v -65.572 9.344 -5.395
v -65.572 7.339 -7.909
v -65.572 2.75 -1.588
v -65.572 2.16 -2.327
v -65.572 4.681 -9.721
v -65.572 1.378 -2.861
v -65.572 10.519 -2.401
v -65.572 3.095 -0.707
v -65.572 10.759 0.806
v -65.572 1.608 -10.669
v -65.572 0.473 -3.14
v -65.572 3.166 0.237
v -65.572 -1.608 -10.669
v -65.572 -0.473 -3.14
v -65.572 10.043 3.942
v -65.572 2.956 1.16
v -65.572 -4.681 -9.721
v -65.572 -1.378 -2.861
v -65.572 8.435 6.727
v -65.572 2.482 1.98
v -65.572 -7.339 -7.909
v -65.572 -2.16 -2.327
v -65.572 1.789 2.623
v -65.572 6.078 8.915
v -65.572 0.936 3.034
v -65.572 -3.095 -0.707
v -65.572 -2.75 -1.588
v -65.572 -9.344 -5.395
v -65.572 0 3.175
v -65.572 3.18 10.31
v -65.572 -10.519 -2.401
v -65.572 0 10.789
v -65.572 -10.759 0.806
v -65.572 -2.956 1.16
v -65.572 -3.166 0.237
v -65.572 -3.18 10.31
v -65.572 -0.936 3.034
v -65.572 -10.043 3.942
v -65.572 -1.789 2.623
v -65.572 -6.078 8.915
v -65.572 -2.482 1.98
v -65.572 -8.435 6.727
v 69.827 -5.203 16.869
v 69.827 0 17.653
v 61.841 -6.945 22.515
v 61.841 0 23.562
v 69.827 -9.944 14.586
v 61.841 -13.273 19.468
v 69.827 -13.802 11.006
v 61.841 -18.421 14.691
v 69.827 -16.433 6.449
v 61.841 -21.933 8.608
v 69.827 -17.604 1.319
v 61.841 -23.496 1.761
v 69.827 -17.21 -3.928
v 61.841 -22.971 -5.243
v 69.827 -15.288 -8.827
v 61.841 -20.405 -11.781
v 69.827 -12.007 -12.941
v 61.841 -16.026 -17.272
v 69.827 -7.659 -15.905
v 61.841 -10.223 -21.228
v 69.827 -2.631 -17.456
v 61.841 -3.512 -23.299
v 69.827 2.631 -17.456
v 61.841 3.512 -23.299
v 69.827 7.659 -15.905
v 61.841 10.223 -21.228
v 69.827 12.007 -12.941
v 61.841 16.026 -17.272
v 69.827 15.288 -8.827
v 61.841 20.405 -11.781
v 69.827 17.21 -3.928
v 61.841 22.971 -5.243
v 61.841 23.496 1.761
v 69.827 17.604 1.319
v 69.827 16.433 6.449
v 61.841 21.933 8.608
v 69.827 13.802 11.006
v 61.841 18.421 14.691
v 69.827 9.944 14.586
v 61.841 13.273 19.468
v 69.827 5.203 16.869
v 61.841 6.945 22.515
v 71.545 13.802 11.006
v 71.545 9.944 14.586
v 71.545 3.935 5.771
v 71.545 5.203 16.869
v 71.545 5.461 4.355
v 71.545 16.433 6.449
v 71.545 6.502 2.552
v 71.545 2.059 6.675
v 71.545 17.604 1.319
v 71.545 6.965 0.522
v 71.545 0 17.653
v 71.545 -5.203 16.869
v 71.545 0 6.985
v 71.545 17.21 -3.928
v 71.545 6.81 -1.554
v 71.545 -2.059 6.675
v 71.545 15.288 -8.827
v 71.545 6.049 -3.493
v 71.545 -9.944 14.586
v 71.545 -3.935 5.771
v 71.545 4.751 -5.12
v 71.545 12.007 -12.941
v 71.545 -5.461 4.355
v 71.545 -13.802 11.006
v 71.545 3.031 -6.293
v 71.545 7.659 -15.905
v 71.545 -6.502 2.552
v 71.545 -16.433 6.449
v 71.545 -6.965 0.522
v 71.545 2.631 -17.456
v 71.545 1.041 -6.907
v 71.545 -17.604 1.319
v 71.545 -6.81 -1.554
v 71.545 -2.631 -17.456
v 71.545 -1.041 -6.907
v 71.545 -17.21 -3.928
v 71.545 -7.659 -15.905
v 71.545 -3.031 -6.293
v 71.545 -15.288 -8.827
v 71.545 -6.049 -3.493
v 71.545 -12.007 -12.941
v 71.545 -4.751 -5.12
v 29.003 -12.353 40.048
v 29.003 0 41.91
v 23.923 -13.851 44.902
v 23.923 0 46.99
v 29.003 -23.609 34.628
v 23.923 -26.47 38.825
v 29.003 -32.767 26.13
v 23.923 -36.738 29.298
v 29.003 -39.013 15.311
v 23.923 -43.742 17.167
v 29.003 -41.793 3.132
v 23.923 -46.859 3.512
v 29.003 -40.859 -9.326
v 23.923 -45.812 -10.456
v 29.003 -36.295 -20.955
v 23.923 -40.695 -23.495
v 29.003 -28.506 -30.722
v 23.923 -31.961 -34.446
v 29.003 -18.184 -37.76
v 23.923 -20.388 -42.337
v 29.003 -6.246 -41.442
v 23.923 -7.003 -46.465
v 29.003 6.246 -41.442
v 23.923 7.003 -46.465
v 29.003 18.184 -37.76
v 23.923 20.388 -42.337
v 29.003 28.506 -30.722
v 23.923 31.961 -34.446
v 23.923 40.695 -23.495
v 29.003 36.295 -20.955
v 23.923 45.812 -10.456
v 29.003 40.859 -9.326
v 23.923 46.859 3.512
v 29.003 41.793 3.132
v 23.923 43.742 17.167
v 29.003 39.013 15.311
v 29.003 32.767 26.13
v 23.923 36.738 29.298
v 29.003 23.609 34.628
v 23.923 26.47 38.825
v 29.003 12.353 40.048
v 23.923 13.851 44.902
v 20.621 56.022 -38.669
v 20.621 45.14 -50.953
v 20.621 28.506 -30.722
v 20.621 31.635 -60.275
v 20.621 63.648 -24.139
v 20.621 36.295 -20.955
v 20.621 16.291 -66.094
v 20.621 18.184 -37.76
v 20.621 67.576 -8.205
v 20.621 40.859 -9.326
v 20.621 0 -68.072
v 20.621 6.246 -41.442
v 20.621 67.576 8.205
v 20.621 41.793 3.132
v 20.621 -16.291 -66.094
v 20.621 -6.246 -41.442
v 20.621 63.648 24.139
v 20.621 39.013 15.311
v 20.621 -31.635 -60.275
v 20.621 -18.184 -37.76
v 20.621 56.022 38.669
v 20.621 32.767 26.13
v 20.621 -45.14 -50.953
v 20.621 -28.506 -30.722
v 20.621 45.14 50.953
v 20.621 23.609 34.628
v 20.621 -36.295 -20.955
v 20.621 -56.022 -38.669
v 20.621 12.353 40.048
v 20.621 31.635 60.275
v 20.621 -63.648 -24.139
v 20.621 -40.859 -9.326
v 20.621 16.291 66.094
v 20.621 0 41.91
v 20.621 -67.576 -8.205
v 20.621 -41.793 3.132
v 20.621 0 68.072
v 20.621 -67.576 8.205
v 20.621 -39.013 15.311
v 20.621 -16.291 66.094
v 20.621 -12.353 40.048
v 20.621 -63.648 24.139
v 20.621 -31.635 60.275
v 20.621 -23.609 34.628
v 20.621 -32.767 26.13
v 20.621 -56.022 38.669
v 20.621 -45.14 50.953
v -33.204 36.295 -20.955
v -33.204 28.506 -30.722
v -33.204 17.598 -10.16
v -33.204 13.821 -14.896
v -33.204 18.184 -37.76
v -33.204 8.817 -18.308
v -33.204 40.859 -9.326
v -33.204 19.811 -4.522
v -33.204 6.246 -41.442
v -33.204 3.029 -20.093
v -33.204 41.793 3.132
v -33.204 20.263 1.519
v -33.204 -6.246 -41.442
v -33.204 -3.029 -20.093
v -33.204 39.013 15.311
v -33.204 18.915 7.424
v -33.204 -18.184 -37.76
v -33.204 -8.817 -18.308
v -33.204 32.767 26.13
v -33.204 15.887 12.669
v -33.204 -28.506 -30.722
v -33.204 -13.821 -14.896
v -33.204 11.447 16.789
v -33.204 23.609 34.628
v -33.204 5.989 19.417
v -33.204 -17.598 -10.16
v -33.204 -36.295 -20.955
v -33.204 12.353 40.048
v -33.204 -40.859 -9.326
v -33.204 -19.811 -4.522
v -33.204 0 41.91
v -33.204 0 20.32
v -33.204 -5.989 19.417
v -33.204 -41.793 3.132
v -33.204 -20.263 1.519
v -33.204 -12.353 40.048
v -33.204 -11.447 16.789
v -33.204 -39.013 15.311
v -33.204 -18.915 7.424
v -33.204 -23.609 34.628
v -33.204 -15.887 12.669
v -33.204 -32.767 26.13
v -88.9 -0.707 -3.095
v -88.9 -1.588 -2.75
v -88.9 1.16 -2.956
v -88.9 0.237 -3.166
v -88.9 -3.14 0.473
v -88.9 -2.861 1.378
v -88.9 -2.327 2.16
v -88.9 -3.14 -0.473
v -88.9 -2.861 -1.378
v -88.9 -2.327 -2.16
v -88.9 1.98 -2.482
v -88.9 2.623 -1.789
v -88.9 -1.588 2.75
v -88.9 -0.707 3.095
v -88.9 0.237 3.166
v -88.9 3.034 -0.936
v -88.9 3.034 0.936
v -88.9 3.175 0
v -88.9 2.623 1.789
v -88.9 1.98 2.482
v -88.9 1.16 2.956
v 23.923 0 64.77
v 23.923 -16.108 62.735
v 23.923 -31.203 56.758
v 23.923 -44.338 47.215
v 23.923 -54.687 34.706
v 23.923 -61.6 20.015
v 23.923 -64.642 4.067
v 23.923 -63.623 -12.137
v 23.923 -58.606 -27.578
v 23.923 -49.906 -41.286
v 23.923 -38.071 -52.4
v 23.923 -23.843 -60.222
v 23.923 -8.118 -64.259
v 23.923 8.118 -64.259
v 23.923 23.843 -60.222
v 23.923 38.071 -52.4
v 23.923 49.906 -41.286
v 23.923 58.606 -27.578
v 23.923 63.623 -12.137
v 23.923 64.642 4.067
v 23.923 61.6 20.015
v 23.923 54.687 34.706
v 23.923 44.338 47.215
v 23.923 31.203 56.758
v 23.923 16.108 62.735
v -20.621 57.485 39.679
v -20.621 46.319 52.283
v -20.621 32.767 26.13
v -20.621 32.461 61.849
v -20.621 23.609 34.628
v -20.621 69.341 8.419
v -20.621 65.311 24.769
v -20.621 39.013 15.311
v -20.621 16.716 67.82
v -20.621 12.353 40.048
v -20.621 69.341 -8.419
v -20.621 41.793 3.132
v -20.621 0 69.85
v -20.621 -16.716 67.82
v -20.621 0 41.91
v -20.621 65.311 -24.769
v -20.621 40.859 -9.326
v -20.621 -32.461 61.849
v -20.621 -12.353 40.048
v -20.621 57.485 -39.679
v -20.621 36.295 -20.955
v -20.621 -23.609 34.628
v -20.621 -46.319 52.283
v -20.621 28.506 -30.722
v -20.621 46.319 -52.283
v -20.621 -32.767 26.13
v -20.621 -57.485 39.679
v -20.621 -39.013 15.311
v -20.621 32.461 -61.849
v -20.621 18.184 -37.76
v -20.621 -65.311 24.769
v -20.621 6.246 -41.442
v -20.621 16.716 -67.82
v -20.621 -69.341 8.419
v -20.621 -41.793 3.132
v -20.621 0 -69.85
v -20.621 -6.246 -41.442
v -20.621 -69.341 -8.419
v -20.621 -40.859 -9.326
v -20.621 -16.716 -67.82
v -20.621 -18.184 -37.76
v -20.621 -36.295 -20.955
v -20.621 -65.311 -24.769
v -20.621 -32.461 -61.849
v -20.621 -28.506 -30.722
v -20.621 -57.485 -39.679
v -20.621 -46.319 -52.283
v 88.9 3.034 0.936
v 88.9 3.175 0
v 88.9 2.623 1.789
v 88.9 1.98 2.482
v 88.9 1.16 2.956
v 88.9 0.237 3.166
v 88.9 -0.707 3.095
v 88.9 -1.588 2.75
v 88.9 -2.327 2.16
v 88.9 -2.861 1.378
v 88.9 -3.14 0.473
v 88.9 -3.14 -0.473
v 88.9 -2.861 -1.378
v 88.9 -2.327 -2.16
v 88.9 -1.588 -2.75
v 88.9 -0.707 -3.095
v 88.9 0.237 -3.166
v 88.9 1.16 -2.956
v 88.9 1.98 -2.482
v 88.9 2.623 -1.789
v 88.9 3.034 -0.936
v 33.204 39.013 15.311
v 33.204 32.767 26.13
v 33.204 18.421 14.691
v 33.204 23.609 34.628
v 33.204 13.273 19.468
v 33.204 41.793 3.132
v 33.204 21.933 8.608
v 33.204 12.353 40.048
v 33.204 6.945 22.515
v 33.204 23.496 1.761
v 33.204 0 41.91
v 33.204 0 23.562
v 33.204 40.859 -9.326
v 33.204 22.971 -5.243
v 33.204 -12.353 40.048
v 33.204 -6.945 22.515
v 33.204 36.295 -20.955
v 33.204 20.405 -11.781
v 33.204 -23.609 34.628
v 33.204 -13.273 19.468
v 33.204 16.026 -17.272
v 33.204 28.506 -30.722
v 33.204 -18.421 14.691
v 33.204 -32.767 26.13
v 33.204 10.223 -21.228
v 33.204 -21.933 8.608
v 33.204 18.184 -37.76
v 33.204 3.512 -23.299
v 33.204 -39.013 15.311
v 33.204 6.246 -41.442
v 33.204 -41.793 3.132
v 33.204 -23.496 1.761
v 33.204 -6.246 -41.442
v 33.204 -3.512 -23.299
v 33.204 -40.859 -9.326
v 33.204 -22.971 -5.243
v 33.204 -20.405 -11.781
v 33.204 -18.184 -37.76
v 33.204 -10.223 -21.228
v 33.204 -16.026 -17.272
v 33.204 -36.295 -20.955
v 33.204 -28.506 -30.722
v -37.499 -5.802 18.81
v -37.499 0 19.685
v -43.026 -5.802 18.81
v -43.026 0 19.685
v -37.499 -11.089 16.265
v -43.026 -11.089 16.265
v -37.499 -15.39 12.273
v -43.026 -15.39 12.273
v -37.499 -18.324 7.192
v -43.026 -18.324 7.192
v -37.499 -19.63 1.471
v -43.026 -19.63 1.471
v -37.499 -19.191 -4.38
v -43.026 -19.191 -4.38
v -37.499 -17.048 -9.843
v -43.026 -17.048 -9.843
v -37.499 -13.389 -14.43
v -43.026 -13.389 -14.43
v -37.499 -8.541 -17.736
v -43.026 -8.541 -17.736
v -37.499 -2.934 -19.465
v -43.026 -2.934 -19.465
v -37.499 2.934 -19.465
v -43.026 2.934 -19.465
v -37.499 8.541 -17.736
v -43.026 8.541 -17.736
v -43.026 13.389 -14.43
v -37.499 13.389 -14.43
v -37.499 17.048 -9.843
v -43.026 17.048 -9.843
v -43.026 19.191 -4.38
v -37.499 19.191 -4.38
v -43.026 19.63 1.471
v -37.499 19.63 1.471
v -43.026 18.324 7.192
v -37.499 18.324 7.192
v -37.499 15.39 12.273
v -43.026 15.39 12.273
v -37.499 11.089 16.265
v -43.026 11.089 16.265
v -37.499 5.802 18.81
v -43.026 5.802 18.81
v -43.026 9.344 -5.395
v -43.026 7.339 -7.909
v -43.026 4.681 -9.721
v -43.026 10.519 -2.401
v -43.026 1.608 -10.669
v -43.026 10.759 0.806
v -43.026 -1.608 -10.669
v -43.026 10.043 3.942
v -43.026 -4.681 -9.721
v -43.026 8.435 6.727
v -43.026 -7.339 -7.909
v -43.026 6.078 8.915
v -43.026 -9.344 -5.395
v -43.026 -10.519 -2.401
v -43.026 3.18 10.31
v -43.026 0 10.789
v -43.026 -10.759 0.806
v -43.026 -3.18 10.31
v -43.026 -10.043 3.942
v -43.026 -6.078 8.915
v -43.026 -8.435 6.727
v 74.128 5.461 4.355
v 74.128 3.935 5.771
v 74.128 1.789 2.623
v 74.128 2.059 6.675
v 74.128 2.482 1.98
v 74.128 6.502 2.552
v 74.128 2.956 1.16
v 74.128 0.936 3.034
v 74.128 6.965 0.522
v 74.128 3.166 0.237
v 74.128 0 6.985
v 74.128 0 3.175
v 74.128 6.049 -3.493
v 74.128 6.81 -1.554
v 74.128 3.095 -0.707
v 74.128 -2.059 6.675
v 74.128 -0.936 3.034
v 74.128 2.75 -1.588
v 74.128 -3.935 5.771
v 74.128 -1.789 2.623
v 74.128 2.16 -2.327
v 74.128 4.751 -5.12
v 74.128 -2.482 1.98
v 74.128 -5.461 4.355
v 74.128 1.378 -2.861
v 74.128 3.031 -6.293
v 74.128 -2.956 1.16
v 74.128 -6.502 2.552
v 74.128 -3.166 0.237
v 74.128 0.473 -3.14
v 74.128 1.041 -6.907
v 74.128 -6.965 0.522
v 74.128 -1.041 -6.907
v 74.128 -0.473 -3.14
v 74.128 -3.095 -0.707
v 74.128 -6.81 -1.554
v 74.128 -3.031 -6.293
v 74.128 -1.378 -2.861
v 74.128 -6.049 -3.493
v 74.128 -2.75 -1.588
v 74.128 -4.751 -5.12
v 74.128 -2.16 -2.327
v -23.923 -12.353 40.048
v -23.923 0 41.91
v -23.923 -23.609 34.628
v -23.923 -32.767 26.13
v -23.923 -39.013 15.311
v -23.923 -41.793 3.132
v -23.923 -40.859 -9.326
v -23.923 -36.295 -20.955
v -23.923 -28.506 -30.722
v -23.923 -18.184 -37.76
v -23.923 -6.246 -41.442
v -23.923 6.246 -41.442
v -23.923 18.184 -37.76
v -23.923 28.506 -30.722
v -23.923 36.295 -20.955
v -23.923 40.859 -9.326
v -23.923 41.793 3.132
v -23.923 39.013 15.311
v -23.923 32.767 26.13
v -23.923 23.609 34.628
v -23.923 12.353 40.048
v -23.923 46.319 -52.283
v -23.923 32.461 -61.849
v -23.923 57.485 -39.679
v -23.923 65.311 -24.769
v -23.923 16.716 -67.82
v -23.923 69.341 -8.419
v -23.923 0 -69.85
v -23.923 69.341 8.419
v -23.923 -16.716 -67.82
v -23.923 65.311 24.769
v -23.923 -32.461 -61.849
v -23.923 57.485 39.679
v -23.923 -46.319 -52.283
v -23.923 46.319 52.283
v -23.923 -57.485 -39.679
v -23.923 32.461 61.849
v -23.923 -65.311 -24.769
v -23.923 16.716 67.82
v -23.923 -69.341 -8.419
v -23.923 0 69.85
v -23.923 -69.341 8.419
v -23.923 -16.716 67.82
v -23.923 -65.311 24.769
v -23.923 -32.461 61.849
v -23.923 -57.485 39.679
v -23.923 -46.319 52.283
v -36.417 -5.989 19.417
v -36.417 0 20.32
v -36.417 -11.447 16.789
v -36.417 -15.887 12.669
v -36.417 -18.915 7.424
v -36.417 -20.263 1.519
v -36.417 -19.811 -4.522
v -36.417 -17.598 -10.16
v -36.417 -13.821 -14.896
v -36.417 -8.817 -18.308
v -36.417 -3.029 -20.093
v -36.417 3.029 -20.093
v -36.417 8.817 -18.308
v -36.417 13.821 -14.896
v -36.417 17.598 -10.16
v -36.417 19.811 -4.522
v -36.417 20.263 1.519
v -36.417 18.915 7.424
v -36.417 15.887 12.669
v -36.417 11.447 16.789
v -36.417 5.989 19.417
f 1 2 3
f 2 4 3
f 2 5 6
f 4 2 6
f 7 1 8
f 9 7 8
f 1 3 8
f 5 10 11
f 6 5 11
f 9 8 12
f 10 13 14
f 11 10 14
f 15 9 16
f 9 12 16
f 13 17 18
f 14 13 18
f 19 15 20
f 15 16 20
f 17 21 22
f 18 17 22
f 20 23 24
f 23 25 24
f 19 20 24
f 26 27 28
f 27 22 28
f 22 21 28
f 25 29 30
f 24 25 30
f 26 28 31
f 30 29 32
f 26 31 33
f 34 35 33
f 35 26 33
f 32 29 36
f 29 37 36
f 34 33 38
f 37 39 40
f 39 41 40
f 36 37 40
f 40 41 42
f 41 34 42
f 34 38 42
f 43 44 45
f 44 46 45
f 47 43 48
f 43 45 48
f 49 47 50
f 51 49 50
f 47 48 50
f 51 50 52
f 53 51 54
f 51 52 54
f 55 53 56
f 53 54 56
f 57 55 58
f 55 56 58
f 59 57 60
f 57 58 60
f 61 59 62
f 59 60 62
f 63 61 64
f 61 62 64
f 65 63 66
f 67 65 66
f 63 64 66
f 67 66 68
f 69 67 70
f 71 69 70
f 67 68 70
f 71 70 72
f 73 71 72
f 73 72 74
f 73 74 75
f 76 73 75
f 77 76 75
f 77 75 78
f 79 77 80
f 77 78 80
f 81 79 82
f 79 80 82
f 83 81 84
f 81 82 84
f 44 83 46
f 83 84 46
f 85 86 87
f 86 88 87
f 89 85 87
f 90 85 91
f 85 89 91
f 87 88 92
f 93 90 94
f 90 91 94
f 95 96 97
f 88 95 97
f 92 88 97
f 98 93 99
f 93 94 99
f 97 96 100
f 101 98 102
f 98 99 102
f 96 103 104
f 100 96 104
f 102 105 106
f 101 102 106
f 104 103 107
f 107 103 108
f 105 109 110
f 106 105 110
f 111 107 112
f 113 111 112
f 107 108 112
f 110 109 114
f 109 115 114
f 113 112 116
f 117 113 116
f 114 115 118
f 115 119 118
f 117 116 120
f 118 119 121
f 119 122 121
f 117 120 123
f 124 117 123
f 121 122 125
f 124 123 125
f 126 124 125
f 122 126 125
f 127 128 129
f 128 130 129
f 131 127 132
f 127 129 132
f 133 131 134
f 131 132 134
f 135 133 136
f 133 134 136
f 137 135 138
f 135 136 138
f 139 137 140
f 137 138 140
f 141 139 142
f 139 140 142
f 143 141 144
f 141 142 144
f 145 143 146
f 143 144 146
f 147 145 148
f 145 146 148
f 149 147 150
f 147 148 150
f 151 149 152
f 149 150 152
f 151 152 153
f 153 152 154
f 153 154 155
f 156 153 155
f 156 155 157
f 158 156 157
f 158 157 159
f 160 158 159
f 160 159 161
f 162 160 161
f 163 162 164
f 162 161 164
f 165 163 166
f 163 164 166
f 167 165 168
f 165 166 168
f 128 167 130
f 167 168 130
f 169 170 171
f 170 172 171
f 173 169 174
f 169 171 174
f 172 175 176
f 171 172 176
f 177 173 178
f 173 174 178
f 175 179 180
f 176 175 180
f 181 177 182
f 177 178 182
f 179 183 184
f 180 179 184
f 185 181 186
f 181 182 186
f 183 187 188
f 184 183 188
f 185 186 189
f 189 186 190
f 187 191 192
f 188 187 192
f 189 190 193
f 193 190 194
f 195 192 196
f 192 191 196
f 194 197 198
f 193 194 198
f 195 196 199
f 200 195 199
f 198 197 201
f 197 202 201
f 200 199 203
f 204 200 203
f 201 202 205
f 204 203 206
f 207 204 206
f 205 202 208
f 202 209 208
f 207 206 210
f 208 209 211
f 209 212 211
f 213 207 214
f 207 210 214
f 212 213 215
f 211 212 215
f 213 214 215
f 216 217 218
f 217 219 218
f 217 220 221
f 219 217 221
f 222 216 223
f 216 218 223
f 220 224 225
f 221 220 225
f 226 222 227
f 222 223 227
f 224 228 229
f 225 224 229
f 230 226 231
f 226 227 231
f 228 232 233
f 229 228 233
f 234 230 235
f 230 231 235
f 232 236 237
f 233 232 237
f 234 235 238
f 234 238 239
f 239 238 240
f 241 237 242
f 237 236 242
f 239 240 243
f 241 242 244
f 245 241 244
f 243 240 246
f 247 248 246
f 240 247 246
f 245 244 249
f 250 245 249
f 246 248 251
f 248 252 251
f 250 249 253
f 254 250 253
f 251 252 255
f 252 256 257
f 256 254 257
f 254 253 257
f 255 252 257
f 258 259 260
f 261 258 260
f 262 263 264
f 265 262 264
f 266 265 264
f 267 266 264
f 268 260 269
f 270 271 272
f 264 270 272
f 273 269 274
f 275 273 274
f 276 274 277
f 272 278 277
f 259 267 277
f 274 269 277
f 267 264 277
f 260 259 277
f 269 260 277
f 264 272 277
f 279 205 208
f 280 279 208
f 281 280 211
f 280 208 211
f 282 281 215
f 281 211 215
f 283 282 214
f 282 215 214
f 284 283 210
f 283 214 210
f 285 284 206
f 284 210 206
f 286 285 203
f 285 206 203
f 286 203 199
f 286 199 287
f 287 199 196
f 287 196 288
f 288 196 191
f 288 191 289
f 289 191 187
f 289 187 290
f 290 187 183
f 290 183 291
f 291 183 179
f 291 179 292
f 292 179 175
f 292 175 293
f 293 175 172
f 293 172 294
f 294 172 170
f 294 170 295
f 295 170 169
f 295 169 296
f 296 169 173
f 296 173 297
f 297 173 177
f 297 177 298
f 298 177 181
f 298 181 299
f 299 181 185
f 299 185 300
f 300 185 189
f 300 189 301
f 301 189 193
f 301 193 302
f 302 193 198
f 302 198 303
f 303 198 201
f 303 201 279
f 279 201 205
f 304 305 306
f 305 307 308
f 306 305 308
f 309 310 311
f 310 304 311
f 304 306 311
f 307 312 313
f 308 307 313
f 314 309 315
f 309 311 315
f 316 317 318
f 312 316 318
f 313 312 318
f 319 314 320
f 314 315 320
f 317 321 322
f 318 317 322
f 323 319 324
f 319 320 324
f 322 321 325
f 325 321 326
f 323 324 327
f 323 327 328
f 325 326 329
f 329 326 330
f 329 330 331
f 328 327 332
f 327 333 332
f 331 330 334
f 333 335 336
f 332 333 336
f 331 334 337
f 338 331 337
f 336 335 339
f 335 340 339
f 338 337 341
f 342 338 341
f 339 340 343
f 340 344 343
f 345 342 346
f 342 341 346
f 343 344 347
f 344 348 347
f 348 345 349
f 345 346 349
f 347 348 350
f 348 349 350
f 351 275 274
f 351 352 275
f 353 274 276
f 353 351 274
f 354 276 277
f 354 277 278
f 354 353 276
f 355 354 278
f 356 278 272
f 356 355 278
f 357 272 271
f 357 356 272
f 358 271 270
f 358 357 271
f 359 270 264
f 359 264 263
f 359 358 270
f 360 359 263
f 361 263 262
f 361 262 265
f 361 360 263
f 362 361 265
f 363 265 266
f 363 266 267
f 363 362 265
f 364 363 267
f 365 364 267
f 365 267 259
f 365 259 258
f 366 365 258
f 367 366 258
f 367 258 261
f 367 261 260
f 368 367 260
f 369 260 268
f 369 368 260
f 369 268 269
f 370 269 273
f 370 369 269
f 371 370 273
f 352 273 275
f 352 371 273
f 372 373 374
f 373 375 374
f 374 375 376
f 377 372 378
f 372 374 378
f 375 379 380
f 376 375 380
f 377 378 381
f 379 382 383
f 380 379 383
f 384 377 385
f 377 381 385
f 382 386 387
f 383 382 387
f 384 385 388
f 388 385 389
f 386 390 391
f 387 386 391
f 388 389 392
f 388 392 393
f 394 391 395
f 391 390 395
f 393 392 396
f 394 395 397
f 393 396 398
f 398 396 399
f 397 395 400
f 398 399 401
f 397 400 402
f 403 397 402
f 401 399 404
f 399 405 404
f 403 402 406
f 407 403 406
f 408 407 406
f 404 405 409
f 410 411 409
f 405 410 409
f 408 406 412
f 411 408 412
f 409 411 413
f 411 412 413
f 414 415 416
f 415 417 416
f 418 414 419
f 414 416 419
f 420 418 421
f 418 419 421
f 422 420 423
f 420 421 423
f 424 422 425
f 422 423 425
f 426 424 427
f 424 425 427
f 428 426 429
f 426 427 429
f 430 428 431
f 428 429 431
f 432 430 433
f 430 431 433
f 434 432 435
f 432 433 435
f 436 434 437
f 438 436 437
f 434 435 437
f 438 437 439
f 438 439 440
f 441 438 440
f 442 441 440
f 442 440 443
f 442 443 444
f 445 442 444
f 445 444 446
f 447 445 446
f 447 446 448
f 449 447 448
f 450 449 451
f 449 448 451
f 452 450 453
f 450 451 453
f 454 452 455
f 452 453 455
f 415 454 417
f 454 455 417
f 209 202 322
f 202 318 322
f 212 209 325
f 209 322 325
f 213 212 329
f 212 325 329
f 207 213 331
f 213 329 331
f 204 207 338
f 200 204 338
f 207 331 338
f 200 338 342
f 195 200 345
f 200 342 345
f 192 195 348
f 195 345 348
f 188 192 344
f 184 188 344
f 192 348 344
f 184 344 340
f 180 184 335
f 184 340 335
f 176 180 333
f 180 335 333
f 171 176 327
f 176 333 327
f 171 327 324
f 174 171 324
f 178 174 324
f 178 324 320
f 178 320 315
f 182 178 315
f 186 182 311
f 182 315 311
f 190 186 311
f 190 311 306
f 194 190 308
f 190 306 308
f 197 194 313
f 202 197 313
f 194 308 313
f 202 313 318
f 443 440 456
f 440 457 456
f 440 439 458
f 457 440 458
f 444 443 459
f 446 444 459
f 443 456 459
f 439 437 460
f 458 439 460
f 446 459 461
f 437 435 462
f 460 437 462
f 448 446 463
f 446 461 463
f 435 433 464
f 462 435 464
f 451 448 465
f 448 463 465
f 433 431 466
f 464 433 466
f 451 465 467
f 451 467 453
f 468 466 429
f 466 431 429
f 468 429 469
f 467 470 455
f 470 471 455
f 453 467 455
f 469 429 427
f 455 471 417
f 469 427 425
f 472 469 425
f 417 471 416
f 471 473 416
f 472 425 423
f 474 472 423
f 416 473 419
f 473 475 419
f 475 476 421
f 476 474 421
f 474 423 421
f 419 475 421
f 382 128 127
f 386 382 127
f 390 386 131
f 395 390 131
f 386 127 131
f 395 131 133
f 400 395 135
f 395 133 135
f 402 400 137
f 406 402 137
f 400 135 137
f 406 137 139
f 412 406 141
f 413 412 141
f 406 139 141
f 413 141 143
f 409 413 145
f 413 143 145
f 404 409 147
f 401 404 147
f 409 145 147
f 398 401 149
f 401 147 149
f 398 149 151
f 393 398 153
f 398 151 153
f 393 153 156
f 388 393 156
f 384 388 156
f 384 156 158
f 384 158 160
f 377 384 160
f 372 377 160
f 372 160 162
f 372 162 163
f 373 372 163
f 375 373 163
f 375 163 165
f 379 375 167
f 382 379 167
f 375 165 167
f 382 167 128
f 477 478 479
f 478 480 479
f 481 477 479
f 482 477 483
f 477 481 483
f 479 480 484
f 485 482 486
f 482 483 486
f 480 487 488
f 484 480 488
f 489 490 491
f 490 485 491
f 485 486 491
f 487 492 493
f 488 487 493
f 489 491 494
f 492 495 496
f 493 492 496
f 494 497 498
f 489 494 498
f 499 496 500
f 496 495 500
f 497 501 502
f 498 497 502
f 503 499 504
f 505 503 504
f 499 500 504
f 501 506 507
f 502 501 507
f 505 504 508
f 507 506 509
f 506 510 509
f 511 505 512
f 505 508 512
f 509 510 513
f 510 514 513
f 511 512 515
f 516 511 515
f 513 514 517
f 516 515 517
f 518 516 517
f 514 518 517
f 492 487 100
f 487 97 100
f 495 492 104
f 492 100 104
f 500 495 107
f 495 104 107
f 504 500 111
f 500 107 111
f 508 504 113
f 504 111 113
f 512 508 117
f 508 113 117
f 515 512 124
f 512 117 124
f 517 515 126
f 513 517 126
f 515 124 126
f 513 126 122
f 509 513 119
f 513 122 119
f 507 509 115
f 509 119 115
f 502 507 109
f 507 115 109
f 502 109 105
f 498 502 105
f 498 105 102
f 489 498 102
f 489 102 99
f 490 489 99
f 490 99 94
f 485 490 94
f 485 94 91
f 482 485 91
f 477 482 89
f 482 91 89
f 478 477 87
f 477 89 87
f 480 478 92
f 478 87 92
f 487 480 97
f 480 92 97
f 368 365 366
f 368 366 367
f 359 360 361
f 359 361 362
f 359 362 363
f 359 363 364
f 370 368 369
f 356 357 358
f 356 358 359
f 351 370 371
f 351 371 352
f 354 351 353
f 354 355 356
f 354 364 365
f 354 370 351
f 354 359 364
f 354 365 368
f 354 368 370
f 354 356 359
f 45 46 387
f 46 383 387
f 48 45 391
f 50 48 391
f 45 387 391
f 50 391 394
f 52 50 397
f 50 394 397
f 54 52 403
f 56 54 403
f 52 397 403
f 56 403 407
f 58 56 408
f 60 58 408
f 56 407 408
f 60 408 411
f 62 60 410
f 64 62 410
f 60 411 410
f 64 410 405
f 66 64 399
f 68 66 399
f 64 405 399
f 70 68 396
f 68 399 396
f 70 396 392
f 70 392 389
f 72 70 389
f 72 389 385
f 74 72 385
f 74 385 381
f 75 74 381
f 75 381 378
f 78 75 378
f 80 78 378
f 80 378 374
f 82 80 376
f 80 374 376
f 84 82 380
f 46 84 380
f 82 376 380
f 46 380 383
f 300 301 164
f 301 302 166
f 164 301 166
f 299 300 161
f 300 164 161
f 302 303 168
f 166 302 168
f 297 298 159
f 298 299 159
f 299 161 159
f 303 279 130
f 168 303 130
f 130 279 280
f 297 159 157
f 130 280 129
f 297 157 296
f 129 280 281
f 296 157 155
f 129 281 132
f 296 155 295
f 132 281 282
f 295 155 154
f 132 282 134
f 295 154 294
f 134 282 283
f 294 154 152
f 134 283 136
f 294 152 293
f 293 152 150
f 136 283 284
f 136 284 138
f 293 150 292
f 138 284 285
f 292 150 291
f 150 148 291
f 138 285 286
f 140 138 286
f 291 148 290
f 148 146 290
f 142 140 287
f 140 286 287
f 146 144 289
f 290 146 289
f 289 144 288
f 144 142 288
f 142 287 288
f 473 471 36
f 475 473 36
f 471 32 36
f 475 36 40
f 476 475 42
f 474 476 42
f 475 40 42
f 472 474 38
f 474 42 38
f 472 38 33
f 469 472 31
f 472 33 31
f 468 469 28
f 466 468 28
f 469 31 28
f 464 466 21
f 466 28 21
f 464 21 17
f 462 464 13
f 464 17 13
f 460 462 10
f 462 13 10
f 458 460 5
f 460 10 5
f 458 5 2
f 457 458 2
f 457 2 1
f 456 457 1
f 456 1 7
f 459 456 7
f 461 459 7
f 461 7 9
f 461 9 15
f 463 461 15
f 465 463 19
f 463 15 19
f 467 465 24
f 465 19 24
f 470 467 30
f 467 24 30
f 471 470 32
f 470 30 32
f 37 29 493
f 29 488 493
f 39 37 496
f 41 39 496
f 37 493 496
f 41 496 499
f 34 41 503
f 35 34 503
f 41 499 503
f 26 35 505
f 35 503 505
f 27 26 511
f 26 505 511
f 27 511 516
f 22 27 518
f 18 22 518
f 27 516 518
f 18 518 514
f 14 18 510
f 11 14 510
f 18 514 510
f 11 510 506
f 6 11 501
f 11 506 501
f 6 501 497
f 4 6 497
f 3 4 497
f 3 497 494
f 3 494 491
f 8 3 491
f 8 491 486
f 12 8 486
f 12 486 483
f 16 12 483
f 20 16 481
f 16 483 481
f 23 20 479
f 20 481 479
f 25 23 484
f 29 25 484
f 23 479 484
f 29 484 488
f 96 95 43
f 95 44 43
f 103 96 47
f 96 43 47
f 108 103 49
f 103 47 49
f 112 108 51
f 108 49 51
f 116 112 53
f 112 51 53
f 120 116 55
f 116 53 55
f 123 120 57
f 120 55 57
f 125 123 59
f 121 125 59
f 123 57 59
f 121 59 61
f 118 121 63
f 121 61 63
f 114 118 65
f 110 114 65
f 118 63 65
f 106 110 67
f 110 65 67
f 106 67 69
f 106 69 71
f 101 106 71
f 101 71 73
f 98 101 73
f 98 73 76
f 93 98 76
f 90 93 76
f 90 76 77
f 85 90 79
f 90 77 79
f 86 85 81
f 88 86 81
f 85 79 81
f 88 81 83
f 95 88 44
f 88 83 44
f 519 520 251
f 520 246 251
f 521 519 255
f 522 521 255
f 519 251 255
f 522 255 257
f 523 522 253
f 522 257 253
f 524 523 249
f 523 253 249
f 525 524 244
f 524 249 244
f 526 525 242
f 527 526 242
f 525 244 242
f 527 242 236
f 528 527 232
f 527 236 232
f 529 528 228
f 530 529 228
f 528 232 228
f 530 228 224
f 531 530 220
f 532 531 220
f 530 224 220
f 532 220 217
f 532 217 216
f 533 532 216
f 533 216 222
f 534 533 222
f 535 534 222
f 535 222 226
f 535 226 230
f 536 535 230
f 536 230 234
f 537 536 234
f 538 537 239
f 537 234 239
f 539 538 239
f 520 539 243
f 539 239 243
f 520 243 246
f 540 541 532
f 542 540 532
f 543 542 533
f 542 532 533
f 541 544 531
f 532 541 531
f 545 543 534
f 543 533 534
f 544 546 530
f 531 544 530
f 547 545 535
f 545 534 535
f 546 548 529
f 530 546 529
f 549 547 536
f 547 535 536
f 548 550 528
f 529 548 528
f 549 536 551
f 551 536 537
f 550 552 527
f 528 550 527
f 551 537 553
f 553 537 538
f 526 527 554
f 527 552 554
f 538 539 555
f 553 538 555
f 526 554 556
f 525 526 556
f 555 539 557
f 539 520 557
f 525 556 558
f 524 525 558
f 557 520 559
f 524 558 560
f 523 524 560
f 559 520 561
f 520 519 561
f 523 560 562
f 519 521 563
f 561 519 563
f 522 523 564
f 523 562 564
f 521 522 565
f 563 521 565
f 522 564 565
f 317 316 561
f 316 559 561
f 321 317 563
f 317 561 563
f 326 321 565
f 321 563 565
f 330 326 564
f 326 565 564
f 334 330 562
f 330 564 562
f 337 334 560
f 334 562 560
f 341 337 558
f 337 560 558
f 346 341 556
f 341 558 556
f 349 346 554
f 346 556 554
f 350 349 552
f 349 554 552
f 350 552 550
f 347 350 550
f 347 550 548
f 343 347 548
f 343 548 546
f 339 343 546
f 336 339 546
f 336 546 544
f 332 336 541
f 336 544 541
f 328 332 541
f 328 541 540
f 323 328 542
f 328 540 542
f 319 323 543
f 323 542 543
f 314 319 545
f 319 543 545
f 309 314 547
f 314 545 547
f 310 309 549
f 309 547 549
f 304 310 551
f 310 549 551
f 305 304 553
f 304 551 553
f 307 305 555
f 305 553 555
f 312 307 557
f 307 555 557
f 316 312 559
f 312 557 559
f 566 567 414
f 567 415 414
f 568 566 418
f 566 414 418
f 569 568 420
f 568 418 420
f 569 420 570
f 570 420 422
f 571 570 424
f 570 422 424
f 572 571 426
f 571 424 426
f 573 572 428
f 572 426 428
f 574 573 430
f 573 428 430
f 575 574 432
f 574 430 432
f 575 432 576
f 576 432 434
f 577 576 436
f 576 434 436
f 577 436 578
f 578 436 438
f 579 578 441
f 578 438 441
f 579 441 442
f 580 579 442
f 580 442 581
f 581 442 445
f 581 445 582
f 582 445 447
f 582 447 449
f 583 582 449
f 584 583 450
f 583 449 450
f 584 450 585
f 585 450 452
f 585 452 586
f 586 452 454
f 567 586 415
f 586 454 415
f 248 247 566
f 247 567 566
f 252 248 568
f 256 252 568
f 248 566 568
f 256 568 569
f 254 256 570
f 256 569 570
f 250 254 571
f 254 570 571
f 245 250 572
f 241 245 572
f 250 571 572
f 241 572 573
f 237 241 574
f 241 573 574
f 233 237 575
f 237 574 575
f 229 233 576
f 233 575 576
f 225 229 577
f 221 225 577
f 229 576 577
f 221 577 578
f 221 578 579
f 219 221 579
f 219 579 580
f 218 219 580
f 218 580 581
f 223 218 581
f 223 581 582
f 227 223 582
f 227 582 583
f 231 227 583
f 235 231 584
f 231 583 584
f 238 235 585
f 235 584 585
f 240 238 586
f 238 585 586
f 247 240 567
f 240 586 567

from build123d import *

# Parameters (mm, degrees)
F0_R     = 3.175
F1_DEPTH = 88.9


# Not quite as in the source:
# - a fillet or chamfer that OpenCascade refuses, or shapes differently, is made with other operations: its cross-section is extruded or revolved along the edge and cut away or added


with BuildPart() as f1:
    # F0 (on Right) → F1 (new body, symmetric)
    with BuildSketch(Plane.YZ):
        Circle(F0_R)
    extrude(amount=F1_DEPTH, both=True)


with BuildPart() as f3:
    # F2 (on Front) → F3 (revolve)
    with BuildSketch(Plane.XZ):
        Polygon((-65.5721798539, 10.789279826), (-65.5721798539, 3.175), (74.1278201461, 3.175), (74.1278201461, 6.985), (71.5452923138, 6.985), (71.5452923138, 17.653), (69.8267191484, 17.653), (61.8413901258, 23.561832648), (33.2043394446, 23.561832648), (33.2043394446, 41.91), (23.9228336141, 41.91), (23.9228336141, 69.85), (20.6208336141, 69.85), (20.6208336141, 41.91), (-20.6208336141, 41.91), (-20.6208336141, 69.85), (-23.9228336141, 69.85), (-23.9228336141, 41.91), (-33.2043394446, 41.91), (-33.2043394446, 20.32), (-36.4167802036, 20.32), (-37.4993234873, 19.685), (-43.0255383253, 19.685), (-43.0255383253, 10.789279826), align=None)
    revolve(axis=Axis((54.40691486, 0, 0), (1, 0, 0)))

    # F5: chamfer of 5.08 on 2 edges, made by hand

    # F5_s1 → F5_t2 (revolve)
    with BuildSketch(Plane.XZ):
        Polygon((29.0028336141, 41.91), (23.9228336141, 46.99), (23.9228336141, 41.91), align=None)
    revolve(axis=Axis((23.9228336141, 0, 0), (1, 0, 0)))

    # F5_s3 → F5_t4 (revolve, cut)
    with BuildSketch(Plane.XZ):
        Polygon((23.9228336141, 64.77), (18.8428336141, 69.85), (23.9228336141, 69.85), align=None)
    revolve(axis=Axis((23.9228336141, 0, 0), (1, 0, 0)), mode=Mode.SUBTRACT)


solid = Compound([f1.part, f3.part])
